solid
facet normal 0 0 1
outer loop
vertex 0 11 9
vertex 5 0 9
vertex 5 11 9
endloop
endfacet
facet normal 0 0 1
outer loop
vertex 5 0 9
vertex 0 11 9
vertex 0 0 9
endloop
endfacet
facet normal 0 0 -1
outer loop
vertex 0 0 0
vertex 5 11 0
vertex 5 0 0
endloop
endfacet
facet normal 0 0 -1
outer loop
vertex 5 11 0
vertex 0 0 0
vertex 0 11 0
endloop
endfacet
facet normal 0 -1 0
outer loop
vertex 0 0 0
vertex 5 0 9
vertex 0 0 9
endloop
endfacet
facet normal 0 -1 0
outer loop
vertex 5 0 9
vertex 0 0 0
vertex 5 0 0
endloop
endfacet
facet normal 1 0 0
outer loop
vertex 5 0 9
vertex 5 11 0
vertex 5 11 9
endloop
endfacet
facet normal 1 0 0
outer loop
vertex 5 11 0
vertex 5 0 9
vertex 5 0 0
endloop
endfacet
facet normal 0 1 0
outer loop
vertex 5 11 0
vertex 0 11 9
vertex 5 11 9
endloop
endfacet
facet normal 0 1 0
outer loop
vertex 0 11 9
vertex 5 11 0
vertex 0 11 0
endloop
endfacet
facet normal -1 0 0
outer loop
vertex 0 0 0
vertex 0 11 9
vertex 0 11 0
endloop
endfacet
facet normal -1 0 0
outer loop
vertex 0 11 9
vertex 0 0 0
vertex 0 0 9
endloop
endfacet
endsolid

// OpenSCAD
// Generated by SolidPython 1.0.1 on 2020-07-29 00:46:54


cube(size = [5, 11, 9]);
/***********************************************
*********      SolidPython code:      **********
************************************************
 
# import packages: SolidPython
from solid import *
from solid.utils import *
from itertools import chain, combinations, permutations


class Resize:

    def __init__(self, scad_file):
        self.scad_file = scad_file
        #self.scad_file = import_scad(scad_file)
        # cone/cylinder param:
        self.r1 = 0
        self.r2 = 0
        self.h = 0
        # rectangular prism param:
        self.w = 0
        self.l = 0
        # ellipse param:
        self.r = 0

    # import OpenScad code (file name corresponds to shape)


    # classify shape + parameters
    def assign(self, param1, param2, param3):
        if self.scad_file == 'cone.scad':
            self.r1 = param1
            self.r2 = param2
            self.h = param3
        elif self.scad_file == 'cylinder.scad':
            self.r1 = param1
            self.r2 = param2
            self.h = param3
        elif self.scad_file == 'rectangularPrism.scad':
            self.h = param1
            self.l = param2
            self.w = param3
        else:
            self.r = param1
            self.h = param2

    # resize parameters
    def iterate(self):
        x = range(3, 20, 2)
        i = 1
        if self.scad_file == 'cone.scad':
            tempList = list(permutations(x, 2))
            for temp in tempList:
                param1 = temp[0]
                param2 = temp[1]
                filepath = 'produced_scad_files/' + 'cone' + str(param1) + '_' + str(param2) + '_' + '.scad'
                scad_render_to_file(cylinder(h=param1, r1=param2, r2=0), filepath)

        elif self.scad_file == 'cylinder.scad':
            tempList = list(permutations(x, 3))
            for temp in tempList:
                param1 = temp[0]
                param2 = temp[1]
                filepath = 'produced_scad_files/' + 'cylinder' + str(param1) + '_' + str(param2) + '_' + '.scad'
                scad_render_to_file(cylinder(h=param1, r1=param2, r2=param2), filepath)

        elif self.scad_file == 'rectangularPrism.scad':
            tempList = list(permutations(x, 3))
            for temp in tempList:
                param1 = temp[0]
                param2 = temp[1]
                param3 = temp[2]
                filepath = 'produced_scad_files/' + 'rectangularPrism' + str(param1) + '_' + str(param2) + '_' + str(
                    param3) + '.scad'
                scad_render_to_file(cube(size=(param1, param2, param3)), filepath)

        elif self.scad_file == 'ellipse.scad':
            tempList = list(permutations(x, 4))
            for temp in tempList:
                param1 = temp[0]
                param2 = temp[1]
                param3 = temp[2]
                param4 = temp[3]
                filepath = 'produced_scad_files/' + 'ellipse' + str(param1) + '_' + str(param2) + '_' + str(param3) + '_' + str(param4) + '.scad'
                scad_render_to_file(scale([param1, param2, param3])(sphere(r=param4)), filepath)

    def render_to_scadfile(self):
        scad_render_to_file(scad, 'example.scad') 
 
************************************************/
